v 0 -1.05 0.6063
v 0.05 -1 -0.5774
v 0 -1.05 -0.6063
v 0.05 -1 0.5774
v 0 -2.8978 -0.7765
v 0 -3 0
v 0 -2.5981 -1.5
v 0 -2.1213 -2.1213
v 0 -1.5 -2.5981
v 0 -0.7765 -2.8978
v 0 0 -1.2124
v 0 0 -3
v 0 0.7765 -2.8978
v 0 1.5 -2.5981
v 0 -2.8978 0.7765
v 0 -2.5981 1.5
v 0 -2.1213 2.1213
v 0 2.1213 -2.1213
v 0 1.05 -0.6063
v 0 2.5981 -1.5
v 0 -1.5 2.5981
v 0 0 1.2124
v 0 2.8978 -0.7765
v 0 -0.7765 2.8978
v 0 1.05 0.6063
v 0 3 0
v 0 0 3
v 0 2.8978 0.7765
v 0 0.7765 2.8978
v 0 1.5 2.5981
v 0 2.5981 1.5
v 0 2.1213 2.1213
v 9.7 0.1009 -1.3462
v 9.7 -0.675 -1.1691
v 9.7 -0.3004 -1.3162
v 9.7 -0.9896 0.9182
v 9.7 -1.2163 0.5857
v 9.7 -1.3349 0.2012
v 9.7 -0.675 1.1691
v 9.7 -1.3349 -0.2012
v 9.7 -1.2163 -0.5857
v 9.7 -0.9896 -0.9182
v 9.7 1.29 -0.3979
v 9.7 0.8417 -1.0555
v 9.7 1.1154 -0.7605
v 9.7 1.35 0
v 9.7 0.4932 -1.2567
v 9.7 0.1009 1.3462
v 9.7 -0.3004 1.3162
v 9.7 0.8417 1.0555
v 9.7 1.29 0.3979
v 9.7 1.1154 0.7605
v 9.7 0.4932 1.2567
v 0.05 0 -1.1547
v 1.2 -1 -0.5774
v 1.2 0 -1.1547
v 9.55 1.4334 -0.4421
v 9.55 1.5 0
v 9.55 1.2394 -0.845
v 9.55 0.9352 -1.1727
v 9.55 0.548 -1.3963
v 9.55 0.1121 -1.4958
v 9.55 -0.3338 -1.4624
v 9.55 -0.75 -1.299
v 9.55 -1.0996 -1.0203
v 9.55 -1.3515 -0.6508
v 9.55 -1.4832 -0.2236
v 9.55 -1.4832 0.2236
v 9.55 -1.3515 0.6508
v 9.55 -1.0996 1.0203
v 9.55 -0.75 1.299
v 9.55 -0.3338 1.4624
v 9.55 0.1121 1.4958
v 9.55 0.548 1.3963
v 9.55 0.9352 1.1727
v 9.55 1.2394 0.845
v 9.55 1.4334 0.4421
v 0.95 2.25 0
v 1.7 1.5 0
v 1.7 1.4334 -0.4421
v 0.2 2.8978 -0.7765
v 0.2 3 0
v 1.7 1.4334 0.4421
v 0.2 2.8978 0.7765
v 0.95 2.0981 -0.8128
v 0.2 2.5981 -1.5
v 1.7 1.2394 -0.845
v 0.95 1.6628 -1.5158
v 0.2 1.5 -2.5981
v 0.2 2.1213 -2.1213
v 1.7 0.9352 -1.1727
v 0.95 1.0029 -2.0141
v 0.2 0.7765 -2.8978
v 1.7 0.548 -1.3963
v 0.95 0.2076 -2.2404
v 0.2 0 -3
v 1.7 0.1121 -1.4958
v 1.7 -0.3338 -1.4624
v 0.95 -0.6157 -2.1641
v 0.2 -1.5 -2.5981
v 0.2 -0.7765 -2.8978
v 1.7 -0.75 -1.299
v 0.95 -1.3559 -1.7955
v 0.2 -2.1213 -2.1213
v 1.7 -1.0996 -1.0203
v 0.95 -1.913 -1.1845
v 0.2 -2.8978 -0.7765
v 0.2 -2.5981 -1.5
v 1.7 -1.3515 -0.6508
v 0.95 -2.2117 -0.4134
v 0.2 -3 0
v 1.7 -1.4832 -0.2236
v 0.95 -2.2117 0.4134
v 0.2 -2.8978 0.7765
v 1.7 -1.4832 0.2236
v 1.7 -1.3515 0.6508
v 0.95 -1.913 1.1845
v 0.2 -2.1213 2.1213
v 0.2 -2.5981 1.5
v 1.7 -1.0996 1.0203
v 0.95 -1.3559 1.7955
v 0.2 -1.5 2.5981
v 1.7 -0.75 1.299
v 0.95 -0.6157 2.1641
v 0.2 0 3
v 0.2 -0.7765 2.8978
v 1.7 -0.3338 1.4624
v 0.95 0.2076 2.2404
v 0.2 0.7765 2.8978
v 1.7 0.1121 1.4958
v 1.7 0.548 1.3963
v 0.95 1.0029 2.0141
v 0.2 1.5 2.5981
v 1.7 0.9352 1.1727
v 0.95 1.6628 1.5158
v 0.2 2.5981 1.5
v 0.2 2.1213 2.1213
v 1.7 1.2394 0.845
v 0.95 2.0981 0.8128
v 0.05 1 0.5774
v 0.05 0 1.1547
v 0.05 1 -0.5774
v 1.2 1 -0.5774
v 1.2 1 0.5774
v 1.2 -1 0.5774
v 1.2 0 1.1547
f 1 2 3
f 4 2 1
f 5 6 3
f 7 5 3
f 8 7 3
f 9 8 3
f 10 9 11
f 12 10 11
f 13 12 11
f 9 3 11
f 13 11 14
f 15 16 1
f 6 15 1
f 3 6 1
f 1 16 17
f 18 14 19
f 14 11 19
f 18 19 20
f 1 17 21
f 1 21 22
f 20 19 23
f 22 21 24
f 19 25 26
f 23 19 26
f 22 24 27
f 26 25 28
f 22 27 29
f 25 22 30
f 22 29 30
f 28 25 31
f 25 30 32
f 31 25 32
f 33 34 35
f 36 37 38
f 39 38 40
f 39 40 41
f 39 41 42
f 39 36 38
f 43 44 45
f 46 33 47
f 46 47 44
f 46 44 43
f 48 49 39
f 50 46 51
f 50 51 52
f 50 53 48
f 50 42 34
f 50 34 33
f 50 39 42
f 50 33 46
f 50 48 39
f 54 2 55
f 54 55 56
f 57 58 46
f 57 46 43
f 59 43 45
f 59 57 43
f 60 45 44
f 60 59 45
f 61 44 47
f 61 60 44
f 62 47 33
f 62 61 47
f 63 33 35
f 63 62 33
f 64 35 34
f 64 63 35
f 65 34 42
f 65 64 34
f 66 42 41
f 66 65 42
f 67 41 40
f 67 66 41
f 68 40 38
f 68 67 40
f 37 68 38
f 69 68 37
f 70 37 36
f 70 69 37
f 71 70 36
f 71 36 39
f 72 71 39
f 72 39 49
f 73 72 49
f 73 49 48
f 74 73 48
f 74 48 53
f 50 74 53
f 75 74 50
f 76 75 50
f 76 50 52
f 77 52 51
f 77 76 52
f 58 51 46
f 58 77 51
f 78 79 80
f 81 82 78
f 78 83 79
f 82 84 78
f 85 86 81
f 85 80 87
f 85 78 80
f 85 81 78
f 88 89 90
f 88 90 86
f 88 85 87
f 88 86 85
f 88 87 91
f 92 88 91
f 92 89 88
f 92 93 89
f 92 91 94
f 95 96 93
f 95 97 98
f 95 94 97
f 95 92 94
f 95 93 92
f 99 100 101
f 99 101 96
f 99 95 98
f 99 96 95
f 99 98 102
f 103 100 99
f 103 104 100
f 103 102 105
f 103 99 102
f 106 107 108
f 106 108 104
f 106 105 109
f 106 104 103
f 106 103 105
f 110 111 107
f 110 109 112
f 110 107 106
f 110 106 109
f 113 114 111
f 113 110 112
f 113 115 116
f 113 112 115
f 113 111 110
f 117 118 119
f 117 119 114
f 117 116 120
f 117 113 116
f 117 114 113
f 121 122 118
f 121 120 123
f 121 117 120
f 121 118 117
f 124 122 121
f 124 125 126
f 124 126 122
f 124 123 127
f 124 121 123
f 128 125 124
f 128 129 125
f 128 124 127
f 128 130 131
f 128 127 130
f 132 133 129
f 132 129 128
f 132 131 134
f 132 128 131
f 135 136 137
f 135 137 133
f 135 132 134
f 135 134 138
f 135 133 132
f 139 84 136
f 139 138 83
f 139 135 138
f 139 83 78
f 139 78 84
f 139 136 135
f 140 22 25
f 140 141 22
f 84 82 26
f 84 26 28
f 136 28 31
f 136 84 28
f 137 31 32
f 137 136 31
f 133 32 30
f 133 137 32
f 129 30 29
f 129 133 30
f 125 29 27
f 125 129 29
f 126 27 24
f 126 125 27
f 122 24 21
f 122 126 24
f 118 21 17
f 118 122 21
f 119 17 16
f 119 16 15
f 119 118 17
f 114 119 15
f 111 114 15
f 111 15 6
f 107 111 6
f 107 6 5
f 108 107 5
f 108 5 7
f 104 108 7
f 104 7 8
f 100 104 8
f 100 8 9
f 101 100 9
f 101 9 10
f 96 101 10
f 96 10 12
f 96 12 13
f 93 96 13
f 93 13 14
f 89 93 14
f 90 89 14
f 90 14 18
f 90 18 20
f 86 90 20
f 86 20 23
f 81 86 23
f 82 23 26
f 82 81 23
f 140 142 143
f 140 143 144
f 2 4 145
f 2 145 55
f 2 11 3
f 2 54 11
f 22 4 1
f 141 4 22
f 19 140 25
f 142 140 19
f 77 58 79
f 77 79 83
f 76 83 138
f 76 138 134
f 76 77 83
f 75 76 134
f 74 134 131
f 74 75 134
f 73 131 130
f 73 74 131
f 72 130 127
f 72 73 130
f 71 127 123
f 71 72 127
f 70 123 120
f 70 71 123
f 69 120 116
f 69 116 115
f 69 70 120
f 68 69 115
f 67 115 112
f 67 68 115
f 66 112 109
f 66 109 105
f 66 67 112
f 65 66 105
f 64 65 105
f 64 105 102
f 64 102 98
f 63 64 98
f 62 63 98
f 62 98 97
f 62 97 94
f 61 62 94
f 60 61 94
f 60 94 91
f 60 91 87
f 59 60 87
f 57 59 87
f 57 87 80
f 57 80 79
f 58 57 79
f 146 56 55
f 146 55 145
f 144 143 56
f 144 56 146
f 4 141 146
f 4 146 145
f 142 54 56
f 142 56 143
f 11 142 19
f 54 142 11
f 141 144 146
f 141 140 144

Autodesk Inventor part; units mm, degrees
ref_plane "YZ Plane" through (0, 0, 0) normal (1, 0, 0) x (0, 1, 0)
ref_plane "XZ Plane" through (0, 0, 0) normal (0, 1, 0) x (-1, 0, 0)
ref_plane "XY Plane" through (0, 0, 0) normal (0, 0, 1) x (1, 0, 0)
sketch "スケッチ1" plane through (0, 0, 0) normal (0, 0, 1) x (1, 0, 0)
  line L0 (0, 0) -> (0, 3)
  line L1 (0, 3) -> (0.2, 3)
  line L2 (0.2, 3) -> (1.7, 1.5)
  line L3 (1.7, 1.5) -> (9.7, 1.5)
  line L4 (9.7, 1.5) -> (9.7, 0)
  line L5 (0, 0) -> (9.7, 0)
  dimension "d0" = 45
  dimension "d1" = 3
  dimension "d2" = 1.7
  dimension "d3" = 1.5
  dimension "d4" = 8
revolve "回転1" add sketch "スケッチ1" angle 360 about axis through (0, 0, 0) along (1, 0, 0)
thread "ねじ1" size "M3x0.5" class "6g" standard "ANSI Metric M Profile" length 44.8
sketch "スケッチ2" plane through (0, 0, 0) normal (-1, 0, 0) x (0, 0, 1)
  line L0 (0.5774, 1) -> (1.1547, 0)
  line L1 (1.1547, 0) -> (0.5774, -1)
  line L2 (0.5774, -1) -> (-0.5774, -1)
  line L3 (-0.5774, -1) -> (-1.1547, 0)
  line L4 (-1.1547, 0) -> (-0.5774, 1)
  line L5 (-0.5774, 1) -> (0.5774, 1)
  circle A0 centre (0, 0) radius 1.1547
  point P0 (0, 0)
  point P1 (0, 0)
  dimension "d8" = 2
extrude "押し出し1" cut sketch "スケッチ2" against normal blind 1.2 contours L0 L1 L2 L3 L4 L5
chamfer "面取り1" distance 0.05 angle 45 6 edges at (0, -0.5, -0.866) (0, 0.5, -0.866) (0, 1, 0) (0, 0.5, 0.866) (0, -1, 0) (0, -0.5, 0.866)
chamfer "面取り2" distance 0.15 angle 45 1 edges at (9.7, -1.5, 0)
properties part number "ネジ皿M3L8" material "鋼、高強度、低合金"
